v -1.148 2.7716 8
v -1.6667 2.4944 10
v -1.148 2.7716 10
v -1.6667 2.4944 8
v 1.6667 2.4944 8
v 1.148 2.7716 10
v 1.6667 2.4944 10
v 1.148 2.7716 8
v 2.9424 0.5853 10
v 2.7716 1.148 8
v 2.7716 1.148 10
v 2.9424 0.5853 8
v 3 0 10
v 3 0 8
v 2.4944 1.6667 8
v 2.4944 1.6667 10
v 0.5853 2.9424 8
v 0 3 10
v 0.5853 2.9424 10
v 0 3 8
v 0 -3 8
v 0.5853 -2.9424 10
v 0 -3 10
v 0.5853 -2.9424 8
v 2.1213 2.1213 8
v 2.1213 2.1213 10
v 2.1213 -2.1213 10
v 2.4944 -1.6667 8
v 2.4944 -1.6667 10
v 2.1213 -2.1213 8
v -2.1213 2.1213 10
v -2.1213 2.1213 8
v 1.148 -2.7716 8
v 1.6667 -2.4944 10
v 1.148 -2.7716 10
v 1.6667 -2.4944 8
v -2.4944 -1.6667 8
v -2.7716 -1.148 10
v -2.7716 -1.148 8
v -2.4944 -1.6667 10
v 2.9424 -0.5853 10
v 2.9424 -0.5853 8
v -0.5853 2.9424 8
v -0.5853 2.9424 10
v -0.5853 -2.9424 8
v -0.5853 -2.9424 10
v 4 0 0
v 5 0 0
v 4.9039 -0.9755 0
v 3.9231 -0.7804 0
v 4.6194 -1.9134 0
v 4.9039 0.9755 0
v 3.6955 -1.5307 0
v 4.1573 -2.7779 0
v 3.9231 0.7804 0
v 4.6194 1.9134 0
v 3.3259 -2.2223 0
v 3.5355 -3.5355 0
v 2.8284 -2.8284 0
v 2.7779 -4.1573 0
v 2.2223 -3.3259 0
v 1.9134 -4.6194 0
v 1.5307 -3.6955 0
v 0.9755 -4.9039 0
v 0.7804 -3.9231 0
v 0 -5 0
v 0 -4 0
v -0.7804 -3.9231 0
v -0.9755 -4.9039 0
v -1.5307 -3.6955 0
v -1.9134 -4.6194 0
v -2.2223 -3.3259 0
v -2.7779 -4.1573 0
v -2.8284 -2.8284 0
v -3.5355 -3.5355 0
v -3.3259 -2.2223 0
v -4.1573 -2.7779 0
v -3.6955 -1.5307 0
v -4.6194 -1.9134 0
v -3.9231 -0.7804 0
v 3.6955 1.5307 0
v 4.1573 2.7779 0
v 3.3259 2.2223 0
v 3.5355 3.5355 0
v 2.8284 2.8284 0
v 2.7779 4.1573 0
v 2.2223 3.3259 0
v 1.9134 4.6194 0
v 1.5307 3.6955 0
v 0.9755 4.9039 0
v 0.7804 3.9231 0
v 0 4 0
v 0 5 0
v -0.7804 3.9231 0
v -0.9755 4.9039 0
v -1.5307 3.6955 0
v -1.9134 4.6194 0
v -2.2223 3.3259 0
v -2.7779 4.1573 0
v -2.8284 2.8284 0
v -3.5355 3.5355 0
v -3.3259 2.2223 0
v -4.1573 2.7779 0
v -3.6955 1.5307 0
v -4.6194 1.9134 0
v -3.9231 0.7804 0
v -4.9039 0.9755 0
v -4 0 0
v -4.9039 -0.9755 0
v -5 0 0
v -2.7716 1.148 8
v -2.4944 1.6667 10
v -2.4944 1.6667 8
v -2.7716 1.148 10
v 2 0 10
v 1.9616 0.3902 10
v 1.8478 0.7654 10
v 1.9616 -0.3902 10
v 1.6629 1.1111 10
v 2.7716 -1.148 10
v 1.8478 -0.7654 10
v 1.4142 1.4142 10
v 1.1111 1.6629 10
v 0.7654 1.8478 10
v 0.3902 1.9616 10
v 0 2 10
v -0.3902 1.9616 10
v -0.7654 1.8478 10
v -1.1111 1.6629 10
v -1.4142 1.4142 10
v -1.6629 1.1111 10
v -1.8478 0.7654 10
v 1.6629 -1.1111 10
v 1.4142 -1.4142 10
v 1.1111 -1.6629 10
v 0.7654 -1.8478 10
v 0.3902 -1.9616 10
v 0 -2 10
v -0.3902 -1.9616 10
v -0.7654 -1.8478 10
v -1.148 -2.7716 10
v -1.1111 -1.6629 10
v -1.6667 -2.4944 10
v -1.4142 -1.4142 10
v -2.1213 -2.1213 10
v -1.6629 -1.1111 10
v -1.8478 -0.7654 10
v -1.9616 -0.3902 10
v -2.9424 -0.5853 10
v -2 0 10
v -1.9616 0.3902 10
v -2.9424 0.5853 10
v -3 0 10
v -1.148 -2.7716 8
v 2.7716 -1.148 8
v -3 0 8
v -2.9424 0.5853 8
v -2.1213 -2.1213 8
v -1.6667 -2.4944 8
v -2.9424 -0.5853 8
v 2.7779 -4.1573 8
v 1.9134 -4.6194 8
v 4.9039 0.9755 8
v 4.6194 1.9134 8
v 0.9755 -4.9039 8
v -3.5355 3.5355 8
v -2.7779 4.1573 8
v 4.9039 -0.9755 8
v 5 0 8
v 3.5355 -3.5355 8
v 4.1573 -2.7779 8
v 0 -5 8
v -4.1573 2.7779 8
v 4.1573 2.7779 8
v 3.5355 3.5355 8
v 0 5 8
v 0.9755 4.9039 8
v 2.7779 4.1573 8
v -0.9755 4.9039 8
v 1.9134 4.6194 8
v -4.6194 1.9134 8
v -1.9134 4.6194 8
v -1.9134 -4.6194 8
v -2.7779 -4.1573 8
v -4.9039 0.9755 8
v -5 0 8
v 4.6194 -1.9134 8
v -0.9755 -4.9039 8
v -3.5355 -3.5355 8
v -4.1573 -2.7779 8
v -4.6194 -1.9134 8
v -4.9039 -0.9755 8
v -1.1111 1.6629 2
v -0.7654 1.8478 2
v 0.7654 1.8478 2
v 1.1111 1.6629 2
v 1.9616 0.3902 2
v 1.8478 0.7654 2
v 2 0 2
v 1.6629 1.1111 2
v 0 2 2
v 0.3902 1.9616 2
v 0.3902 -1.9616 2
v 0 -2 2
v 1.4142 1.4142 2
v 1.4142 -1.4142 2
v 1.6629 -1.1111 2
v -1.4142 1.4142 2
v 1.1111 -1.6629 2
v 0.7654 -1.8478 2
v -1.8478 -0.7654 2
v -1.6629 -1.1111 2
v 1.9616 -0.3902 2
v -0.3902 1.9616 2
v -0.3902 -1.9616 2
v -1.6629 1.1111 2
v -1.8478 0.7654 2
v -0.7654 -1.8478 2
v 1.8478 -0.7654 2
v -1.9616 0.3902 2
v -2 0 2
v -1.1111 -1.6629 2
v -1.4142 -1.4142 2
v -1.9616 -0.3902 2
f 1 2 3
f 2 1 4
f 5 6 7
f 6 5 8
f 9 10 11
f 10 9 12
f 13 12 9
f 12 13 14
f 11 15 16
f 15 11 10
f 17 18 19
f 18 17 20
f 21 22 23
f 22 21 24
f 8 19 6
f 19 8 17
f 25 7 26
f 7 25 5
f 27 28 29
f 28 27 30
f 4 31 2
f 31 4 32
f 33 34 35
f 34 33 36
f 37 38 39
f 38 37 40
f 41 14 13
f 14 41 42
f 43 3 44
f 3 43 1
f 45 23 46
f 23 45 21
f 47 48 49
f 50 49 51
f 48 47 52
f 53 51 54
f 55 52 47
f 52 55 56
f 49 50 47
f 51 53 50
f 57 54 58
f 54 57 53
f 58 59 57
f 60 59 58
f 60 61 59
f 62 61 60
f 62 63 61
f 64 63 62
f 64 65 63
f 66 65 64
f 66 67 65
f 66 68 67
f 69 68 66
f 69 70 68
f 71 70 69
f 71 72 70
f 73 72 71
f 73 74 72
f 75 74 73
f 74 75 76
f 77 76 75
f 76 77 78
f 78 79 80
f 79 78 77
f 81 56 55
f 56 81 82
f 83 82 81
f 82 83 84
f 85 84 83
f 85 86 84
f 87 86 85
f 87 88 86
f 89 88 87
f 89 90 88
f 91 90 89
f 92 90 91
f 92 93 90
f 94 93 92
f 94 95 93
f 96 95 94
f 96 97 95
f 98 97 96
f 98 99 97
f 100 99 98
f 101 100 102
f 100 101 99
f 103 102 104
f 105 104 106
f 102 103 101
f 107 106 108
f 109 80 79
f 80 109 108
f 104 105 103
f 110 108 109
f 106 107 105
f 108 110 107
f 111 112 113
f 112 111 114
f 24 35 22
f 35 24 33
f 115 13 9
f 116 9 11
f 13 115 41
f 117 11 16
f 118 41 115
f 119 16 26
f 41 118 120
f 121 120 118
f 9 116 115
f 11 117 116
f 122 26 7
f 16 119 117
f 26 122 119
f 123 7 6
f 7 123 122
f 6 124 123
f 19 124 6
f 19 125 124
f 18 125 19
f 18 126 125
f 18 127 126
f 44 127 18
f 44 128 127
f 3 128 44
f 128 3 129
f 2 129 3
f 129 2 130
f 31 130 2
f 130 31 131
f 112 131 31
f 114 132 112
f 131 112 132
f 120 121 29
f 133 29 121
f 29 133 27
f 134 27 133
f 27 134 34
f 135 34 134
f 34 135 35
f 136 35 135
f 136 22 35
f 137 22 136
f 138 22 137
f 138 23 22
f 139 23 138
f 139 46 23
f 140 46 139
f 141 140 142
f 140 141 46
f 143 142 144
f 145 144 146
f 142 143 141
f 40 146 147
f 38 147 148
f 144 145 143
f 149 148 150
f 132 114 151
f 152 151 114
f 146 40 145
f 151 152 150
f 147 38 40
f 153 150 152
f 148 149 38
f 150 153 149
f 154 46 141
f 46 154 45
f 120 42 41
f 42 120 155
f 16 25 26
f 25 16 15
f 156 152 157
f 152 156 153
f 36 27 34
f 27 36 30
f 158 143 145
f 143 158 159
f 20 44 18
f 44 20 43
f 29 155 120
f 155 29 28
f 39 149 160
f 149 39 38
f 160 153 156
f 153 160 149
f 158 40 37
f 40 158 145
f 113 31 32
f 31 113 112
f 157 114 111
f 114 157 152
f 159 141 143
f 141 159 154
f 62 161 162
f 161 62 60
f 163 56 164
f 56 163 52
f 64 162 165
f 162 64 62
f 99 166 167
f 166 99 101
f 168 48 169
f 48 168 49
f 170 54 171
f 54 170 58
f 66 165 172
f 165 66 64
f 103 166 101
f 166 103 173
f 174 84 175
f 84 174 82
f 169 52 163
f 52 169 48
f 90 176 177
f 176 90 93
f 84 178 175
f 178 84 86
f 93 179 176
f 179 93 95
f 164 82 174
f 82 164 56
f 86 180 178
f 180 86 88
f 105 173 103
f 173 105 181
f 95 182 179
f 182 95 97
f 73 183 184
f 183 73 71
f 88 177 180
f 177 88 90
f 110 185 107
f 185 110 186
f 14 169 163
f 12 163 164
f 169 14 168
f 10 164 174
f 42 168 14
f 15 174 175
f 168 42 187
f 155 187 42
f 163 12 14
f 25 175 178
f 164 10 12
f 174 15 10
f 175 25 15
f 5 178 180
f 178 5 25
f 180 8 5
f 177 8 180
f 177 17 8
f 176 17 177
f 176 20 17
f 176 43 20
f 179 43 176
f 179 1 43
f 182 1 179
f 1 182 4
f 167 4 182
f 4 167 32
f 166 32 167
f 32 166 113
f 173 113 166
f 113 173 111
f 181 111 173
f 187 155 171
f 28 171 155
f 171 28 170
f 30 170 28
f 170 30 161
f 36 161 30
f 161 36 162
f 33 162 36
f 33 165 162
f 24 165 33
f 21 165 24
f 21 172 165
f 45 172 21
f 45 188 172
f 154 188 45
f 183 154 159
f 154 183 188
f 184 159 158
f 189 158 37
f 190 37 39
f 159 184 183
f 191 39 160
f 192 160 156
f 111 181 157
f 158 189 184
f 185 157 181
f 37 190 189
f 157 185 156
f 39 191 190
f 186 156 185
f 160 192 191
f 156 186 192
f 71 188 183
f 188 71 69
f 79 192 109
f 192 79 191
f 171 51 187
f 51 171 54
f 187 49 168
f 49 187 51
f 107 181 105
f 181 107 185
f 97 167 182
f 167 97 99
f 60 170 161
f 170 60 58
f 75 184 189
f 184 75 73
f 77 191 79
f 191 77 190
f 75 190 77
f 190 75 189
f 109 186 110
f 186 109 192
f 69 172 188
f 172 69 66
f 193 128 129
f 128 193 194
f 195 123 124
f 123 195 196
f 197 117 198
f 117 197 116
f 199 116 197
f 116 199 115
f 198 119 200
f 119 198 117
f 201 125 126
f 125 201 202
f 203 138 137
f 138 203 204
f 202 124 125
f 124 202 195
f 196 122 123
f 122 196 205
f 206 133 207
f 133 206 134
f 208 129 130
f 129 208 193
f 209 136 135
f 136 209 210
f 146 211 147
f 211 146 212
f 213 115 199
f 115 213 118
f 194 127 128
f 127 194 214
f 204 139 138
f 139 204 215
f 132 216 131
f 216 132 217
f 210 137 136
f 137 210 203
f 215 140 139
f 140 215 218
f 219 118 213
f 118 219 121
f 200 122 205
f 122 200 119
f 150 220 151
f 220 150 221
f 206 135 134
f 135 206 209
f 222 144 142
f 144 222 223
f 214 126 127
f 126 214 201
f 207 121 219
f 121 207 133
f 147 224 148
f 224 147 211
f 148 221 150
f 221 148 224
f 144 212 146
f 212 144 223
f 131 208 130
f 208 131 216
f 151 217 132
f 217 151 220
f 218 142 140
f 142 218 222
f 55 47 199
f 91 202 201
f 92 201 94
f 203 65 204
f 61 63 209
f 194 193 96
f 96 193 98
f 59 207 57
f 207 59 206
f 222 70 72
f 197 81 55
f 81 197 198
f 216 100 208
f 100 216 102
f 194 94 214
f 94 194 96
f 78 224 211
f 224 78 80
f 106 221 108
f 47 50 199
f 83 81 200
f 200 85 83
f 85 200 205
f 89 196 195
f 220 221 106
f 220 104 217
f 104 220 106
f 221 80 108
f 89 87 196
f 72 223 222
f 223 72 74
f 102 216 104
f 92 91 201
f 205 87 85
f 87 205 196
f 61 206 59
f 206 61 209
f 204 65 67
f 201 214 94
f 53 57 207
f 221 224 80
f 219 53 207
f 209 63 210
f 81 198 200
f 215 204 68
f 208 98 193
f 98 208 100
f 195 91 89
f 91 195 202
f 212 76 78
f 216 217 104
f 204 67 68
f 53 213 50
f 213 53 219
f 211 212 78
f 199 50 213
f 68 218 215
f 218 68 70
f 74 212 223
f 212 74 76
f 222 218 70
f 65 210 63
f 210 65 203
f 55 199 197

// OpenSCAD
$fn=32;
difference() {
  union() {
  cylinder(d=6,h=10);
  cylinder(d=10,h=8);
  }
  cylinder(d=4,h=10);
  cylinder(d1=8,d2=4,h=2);
}
